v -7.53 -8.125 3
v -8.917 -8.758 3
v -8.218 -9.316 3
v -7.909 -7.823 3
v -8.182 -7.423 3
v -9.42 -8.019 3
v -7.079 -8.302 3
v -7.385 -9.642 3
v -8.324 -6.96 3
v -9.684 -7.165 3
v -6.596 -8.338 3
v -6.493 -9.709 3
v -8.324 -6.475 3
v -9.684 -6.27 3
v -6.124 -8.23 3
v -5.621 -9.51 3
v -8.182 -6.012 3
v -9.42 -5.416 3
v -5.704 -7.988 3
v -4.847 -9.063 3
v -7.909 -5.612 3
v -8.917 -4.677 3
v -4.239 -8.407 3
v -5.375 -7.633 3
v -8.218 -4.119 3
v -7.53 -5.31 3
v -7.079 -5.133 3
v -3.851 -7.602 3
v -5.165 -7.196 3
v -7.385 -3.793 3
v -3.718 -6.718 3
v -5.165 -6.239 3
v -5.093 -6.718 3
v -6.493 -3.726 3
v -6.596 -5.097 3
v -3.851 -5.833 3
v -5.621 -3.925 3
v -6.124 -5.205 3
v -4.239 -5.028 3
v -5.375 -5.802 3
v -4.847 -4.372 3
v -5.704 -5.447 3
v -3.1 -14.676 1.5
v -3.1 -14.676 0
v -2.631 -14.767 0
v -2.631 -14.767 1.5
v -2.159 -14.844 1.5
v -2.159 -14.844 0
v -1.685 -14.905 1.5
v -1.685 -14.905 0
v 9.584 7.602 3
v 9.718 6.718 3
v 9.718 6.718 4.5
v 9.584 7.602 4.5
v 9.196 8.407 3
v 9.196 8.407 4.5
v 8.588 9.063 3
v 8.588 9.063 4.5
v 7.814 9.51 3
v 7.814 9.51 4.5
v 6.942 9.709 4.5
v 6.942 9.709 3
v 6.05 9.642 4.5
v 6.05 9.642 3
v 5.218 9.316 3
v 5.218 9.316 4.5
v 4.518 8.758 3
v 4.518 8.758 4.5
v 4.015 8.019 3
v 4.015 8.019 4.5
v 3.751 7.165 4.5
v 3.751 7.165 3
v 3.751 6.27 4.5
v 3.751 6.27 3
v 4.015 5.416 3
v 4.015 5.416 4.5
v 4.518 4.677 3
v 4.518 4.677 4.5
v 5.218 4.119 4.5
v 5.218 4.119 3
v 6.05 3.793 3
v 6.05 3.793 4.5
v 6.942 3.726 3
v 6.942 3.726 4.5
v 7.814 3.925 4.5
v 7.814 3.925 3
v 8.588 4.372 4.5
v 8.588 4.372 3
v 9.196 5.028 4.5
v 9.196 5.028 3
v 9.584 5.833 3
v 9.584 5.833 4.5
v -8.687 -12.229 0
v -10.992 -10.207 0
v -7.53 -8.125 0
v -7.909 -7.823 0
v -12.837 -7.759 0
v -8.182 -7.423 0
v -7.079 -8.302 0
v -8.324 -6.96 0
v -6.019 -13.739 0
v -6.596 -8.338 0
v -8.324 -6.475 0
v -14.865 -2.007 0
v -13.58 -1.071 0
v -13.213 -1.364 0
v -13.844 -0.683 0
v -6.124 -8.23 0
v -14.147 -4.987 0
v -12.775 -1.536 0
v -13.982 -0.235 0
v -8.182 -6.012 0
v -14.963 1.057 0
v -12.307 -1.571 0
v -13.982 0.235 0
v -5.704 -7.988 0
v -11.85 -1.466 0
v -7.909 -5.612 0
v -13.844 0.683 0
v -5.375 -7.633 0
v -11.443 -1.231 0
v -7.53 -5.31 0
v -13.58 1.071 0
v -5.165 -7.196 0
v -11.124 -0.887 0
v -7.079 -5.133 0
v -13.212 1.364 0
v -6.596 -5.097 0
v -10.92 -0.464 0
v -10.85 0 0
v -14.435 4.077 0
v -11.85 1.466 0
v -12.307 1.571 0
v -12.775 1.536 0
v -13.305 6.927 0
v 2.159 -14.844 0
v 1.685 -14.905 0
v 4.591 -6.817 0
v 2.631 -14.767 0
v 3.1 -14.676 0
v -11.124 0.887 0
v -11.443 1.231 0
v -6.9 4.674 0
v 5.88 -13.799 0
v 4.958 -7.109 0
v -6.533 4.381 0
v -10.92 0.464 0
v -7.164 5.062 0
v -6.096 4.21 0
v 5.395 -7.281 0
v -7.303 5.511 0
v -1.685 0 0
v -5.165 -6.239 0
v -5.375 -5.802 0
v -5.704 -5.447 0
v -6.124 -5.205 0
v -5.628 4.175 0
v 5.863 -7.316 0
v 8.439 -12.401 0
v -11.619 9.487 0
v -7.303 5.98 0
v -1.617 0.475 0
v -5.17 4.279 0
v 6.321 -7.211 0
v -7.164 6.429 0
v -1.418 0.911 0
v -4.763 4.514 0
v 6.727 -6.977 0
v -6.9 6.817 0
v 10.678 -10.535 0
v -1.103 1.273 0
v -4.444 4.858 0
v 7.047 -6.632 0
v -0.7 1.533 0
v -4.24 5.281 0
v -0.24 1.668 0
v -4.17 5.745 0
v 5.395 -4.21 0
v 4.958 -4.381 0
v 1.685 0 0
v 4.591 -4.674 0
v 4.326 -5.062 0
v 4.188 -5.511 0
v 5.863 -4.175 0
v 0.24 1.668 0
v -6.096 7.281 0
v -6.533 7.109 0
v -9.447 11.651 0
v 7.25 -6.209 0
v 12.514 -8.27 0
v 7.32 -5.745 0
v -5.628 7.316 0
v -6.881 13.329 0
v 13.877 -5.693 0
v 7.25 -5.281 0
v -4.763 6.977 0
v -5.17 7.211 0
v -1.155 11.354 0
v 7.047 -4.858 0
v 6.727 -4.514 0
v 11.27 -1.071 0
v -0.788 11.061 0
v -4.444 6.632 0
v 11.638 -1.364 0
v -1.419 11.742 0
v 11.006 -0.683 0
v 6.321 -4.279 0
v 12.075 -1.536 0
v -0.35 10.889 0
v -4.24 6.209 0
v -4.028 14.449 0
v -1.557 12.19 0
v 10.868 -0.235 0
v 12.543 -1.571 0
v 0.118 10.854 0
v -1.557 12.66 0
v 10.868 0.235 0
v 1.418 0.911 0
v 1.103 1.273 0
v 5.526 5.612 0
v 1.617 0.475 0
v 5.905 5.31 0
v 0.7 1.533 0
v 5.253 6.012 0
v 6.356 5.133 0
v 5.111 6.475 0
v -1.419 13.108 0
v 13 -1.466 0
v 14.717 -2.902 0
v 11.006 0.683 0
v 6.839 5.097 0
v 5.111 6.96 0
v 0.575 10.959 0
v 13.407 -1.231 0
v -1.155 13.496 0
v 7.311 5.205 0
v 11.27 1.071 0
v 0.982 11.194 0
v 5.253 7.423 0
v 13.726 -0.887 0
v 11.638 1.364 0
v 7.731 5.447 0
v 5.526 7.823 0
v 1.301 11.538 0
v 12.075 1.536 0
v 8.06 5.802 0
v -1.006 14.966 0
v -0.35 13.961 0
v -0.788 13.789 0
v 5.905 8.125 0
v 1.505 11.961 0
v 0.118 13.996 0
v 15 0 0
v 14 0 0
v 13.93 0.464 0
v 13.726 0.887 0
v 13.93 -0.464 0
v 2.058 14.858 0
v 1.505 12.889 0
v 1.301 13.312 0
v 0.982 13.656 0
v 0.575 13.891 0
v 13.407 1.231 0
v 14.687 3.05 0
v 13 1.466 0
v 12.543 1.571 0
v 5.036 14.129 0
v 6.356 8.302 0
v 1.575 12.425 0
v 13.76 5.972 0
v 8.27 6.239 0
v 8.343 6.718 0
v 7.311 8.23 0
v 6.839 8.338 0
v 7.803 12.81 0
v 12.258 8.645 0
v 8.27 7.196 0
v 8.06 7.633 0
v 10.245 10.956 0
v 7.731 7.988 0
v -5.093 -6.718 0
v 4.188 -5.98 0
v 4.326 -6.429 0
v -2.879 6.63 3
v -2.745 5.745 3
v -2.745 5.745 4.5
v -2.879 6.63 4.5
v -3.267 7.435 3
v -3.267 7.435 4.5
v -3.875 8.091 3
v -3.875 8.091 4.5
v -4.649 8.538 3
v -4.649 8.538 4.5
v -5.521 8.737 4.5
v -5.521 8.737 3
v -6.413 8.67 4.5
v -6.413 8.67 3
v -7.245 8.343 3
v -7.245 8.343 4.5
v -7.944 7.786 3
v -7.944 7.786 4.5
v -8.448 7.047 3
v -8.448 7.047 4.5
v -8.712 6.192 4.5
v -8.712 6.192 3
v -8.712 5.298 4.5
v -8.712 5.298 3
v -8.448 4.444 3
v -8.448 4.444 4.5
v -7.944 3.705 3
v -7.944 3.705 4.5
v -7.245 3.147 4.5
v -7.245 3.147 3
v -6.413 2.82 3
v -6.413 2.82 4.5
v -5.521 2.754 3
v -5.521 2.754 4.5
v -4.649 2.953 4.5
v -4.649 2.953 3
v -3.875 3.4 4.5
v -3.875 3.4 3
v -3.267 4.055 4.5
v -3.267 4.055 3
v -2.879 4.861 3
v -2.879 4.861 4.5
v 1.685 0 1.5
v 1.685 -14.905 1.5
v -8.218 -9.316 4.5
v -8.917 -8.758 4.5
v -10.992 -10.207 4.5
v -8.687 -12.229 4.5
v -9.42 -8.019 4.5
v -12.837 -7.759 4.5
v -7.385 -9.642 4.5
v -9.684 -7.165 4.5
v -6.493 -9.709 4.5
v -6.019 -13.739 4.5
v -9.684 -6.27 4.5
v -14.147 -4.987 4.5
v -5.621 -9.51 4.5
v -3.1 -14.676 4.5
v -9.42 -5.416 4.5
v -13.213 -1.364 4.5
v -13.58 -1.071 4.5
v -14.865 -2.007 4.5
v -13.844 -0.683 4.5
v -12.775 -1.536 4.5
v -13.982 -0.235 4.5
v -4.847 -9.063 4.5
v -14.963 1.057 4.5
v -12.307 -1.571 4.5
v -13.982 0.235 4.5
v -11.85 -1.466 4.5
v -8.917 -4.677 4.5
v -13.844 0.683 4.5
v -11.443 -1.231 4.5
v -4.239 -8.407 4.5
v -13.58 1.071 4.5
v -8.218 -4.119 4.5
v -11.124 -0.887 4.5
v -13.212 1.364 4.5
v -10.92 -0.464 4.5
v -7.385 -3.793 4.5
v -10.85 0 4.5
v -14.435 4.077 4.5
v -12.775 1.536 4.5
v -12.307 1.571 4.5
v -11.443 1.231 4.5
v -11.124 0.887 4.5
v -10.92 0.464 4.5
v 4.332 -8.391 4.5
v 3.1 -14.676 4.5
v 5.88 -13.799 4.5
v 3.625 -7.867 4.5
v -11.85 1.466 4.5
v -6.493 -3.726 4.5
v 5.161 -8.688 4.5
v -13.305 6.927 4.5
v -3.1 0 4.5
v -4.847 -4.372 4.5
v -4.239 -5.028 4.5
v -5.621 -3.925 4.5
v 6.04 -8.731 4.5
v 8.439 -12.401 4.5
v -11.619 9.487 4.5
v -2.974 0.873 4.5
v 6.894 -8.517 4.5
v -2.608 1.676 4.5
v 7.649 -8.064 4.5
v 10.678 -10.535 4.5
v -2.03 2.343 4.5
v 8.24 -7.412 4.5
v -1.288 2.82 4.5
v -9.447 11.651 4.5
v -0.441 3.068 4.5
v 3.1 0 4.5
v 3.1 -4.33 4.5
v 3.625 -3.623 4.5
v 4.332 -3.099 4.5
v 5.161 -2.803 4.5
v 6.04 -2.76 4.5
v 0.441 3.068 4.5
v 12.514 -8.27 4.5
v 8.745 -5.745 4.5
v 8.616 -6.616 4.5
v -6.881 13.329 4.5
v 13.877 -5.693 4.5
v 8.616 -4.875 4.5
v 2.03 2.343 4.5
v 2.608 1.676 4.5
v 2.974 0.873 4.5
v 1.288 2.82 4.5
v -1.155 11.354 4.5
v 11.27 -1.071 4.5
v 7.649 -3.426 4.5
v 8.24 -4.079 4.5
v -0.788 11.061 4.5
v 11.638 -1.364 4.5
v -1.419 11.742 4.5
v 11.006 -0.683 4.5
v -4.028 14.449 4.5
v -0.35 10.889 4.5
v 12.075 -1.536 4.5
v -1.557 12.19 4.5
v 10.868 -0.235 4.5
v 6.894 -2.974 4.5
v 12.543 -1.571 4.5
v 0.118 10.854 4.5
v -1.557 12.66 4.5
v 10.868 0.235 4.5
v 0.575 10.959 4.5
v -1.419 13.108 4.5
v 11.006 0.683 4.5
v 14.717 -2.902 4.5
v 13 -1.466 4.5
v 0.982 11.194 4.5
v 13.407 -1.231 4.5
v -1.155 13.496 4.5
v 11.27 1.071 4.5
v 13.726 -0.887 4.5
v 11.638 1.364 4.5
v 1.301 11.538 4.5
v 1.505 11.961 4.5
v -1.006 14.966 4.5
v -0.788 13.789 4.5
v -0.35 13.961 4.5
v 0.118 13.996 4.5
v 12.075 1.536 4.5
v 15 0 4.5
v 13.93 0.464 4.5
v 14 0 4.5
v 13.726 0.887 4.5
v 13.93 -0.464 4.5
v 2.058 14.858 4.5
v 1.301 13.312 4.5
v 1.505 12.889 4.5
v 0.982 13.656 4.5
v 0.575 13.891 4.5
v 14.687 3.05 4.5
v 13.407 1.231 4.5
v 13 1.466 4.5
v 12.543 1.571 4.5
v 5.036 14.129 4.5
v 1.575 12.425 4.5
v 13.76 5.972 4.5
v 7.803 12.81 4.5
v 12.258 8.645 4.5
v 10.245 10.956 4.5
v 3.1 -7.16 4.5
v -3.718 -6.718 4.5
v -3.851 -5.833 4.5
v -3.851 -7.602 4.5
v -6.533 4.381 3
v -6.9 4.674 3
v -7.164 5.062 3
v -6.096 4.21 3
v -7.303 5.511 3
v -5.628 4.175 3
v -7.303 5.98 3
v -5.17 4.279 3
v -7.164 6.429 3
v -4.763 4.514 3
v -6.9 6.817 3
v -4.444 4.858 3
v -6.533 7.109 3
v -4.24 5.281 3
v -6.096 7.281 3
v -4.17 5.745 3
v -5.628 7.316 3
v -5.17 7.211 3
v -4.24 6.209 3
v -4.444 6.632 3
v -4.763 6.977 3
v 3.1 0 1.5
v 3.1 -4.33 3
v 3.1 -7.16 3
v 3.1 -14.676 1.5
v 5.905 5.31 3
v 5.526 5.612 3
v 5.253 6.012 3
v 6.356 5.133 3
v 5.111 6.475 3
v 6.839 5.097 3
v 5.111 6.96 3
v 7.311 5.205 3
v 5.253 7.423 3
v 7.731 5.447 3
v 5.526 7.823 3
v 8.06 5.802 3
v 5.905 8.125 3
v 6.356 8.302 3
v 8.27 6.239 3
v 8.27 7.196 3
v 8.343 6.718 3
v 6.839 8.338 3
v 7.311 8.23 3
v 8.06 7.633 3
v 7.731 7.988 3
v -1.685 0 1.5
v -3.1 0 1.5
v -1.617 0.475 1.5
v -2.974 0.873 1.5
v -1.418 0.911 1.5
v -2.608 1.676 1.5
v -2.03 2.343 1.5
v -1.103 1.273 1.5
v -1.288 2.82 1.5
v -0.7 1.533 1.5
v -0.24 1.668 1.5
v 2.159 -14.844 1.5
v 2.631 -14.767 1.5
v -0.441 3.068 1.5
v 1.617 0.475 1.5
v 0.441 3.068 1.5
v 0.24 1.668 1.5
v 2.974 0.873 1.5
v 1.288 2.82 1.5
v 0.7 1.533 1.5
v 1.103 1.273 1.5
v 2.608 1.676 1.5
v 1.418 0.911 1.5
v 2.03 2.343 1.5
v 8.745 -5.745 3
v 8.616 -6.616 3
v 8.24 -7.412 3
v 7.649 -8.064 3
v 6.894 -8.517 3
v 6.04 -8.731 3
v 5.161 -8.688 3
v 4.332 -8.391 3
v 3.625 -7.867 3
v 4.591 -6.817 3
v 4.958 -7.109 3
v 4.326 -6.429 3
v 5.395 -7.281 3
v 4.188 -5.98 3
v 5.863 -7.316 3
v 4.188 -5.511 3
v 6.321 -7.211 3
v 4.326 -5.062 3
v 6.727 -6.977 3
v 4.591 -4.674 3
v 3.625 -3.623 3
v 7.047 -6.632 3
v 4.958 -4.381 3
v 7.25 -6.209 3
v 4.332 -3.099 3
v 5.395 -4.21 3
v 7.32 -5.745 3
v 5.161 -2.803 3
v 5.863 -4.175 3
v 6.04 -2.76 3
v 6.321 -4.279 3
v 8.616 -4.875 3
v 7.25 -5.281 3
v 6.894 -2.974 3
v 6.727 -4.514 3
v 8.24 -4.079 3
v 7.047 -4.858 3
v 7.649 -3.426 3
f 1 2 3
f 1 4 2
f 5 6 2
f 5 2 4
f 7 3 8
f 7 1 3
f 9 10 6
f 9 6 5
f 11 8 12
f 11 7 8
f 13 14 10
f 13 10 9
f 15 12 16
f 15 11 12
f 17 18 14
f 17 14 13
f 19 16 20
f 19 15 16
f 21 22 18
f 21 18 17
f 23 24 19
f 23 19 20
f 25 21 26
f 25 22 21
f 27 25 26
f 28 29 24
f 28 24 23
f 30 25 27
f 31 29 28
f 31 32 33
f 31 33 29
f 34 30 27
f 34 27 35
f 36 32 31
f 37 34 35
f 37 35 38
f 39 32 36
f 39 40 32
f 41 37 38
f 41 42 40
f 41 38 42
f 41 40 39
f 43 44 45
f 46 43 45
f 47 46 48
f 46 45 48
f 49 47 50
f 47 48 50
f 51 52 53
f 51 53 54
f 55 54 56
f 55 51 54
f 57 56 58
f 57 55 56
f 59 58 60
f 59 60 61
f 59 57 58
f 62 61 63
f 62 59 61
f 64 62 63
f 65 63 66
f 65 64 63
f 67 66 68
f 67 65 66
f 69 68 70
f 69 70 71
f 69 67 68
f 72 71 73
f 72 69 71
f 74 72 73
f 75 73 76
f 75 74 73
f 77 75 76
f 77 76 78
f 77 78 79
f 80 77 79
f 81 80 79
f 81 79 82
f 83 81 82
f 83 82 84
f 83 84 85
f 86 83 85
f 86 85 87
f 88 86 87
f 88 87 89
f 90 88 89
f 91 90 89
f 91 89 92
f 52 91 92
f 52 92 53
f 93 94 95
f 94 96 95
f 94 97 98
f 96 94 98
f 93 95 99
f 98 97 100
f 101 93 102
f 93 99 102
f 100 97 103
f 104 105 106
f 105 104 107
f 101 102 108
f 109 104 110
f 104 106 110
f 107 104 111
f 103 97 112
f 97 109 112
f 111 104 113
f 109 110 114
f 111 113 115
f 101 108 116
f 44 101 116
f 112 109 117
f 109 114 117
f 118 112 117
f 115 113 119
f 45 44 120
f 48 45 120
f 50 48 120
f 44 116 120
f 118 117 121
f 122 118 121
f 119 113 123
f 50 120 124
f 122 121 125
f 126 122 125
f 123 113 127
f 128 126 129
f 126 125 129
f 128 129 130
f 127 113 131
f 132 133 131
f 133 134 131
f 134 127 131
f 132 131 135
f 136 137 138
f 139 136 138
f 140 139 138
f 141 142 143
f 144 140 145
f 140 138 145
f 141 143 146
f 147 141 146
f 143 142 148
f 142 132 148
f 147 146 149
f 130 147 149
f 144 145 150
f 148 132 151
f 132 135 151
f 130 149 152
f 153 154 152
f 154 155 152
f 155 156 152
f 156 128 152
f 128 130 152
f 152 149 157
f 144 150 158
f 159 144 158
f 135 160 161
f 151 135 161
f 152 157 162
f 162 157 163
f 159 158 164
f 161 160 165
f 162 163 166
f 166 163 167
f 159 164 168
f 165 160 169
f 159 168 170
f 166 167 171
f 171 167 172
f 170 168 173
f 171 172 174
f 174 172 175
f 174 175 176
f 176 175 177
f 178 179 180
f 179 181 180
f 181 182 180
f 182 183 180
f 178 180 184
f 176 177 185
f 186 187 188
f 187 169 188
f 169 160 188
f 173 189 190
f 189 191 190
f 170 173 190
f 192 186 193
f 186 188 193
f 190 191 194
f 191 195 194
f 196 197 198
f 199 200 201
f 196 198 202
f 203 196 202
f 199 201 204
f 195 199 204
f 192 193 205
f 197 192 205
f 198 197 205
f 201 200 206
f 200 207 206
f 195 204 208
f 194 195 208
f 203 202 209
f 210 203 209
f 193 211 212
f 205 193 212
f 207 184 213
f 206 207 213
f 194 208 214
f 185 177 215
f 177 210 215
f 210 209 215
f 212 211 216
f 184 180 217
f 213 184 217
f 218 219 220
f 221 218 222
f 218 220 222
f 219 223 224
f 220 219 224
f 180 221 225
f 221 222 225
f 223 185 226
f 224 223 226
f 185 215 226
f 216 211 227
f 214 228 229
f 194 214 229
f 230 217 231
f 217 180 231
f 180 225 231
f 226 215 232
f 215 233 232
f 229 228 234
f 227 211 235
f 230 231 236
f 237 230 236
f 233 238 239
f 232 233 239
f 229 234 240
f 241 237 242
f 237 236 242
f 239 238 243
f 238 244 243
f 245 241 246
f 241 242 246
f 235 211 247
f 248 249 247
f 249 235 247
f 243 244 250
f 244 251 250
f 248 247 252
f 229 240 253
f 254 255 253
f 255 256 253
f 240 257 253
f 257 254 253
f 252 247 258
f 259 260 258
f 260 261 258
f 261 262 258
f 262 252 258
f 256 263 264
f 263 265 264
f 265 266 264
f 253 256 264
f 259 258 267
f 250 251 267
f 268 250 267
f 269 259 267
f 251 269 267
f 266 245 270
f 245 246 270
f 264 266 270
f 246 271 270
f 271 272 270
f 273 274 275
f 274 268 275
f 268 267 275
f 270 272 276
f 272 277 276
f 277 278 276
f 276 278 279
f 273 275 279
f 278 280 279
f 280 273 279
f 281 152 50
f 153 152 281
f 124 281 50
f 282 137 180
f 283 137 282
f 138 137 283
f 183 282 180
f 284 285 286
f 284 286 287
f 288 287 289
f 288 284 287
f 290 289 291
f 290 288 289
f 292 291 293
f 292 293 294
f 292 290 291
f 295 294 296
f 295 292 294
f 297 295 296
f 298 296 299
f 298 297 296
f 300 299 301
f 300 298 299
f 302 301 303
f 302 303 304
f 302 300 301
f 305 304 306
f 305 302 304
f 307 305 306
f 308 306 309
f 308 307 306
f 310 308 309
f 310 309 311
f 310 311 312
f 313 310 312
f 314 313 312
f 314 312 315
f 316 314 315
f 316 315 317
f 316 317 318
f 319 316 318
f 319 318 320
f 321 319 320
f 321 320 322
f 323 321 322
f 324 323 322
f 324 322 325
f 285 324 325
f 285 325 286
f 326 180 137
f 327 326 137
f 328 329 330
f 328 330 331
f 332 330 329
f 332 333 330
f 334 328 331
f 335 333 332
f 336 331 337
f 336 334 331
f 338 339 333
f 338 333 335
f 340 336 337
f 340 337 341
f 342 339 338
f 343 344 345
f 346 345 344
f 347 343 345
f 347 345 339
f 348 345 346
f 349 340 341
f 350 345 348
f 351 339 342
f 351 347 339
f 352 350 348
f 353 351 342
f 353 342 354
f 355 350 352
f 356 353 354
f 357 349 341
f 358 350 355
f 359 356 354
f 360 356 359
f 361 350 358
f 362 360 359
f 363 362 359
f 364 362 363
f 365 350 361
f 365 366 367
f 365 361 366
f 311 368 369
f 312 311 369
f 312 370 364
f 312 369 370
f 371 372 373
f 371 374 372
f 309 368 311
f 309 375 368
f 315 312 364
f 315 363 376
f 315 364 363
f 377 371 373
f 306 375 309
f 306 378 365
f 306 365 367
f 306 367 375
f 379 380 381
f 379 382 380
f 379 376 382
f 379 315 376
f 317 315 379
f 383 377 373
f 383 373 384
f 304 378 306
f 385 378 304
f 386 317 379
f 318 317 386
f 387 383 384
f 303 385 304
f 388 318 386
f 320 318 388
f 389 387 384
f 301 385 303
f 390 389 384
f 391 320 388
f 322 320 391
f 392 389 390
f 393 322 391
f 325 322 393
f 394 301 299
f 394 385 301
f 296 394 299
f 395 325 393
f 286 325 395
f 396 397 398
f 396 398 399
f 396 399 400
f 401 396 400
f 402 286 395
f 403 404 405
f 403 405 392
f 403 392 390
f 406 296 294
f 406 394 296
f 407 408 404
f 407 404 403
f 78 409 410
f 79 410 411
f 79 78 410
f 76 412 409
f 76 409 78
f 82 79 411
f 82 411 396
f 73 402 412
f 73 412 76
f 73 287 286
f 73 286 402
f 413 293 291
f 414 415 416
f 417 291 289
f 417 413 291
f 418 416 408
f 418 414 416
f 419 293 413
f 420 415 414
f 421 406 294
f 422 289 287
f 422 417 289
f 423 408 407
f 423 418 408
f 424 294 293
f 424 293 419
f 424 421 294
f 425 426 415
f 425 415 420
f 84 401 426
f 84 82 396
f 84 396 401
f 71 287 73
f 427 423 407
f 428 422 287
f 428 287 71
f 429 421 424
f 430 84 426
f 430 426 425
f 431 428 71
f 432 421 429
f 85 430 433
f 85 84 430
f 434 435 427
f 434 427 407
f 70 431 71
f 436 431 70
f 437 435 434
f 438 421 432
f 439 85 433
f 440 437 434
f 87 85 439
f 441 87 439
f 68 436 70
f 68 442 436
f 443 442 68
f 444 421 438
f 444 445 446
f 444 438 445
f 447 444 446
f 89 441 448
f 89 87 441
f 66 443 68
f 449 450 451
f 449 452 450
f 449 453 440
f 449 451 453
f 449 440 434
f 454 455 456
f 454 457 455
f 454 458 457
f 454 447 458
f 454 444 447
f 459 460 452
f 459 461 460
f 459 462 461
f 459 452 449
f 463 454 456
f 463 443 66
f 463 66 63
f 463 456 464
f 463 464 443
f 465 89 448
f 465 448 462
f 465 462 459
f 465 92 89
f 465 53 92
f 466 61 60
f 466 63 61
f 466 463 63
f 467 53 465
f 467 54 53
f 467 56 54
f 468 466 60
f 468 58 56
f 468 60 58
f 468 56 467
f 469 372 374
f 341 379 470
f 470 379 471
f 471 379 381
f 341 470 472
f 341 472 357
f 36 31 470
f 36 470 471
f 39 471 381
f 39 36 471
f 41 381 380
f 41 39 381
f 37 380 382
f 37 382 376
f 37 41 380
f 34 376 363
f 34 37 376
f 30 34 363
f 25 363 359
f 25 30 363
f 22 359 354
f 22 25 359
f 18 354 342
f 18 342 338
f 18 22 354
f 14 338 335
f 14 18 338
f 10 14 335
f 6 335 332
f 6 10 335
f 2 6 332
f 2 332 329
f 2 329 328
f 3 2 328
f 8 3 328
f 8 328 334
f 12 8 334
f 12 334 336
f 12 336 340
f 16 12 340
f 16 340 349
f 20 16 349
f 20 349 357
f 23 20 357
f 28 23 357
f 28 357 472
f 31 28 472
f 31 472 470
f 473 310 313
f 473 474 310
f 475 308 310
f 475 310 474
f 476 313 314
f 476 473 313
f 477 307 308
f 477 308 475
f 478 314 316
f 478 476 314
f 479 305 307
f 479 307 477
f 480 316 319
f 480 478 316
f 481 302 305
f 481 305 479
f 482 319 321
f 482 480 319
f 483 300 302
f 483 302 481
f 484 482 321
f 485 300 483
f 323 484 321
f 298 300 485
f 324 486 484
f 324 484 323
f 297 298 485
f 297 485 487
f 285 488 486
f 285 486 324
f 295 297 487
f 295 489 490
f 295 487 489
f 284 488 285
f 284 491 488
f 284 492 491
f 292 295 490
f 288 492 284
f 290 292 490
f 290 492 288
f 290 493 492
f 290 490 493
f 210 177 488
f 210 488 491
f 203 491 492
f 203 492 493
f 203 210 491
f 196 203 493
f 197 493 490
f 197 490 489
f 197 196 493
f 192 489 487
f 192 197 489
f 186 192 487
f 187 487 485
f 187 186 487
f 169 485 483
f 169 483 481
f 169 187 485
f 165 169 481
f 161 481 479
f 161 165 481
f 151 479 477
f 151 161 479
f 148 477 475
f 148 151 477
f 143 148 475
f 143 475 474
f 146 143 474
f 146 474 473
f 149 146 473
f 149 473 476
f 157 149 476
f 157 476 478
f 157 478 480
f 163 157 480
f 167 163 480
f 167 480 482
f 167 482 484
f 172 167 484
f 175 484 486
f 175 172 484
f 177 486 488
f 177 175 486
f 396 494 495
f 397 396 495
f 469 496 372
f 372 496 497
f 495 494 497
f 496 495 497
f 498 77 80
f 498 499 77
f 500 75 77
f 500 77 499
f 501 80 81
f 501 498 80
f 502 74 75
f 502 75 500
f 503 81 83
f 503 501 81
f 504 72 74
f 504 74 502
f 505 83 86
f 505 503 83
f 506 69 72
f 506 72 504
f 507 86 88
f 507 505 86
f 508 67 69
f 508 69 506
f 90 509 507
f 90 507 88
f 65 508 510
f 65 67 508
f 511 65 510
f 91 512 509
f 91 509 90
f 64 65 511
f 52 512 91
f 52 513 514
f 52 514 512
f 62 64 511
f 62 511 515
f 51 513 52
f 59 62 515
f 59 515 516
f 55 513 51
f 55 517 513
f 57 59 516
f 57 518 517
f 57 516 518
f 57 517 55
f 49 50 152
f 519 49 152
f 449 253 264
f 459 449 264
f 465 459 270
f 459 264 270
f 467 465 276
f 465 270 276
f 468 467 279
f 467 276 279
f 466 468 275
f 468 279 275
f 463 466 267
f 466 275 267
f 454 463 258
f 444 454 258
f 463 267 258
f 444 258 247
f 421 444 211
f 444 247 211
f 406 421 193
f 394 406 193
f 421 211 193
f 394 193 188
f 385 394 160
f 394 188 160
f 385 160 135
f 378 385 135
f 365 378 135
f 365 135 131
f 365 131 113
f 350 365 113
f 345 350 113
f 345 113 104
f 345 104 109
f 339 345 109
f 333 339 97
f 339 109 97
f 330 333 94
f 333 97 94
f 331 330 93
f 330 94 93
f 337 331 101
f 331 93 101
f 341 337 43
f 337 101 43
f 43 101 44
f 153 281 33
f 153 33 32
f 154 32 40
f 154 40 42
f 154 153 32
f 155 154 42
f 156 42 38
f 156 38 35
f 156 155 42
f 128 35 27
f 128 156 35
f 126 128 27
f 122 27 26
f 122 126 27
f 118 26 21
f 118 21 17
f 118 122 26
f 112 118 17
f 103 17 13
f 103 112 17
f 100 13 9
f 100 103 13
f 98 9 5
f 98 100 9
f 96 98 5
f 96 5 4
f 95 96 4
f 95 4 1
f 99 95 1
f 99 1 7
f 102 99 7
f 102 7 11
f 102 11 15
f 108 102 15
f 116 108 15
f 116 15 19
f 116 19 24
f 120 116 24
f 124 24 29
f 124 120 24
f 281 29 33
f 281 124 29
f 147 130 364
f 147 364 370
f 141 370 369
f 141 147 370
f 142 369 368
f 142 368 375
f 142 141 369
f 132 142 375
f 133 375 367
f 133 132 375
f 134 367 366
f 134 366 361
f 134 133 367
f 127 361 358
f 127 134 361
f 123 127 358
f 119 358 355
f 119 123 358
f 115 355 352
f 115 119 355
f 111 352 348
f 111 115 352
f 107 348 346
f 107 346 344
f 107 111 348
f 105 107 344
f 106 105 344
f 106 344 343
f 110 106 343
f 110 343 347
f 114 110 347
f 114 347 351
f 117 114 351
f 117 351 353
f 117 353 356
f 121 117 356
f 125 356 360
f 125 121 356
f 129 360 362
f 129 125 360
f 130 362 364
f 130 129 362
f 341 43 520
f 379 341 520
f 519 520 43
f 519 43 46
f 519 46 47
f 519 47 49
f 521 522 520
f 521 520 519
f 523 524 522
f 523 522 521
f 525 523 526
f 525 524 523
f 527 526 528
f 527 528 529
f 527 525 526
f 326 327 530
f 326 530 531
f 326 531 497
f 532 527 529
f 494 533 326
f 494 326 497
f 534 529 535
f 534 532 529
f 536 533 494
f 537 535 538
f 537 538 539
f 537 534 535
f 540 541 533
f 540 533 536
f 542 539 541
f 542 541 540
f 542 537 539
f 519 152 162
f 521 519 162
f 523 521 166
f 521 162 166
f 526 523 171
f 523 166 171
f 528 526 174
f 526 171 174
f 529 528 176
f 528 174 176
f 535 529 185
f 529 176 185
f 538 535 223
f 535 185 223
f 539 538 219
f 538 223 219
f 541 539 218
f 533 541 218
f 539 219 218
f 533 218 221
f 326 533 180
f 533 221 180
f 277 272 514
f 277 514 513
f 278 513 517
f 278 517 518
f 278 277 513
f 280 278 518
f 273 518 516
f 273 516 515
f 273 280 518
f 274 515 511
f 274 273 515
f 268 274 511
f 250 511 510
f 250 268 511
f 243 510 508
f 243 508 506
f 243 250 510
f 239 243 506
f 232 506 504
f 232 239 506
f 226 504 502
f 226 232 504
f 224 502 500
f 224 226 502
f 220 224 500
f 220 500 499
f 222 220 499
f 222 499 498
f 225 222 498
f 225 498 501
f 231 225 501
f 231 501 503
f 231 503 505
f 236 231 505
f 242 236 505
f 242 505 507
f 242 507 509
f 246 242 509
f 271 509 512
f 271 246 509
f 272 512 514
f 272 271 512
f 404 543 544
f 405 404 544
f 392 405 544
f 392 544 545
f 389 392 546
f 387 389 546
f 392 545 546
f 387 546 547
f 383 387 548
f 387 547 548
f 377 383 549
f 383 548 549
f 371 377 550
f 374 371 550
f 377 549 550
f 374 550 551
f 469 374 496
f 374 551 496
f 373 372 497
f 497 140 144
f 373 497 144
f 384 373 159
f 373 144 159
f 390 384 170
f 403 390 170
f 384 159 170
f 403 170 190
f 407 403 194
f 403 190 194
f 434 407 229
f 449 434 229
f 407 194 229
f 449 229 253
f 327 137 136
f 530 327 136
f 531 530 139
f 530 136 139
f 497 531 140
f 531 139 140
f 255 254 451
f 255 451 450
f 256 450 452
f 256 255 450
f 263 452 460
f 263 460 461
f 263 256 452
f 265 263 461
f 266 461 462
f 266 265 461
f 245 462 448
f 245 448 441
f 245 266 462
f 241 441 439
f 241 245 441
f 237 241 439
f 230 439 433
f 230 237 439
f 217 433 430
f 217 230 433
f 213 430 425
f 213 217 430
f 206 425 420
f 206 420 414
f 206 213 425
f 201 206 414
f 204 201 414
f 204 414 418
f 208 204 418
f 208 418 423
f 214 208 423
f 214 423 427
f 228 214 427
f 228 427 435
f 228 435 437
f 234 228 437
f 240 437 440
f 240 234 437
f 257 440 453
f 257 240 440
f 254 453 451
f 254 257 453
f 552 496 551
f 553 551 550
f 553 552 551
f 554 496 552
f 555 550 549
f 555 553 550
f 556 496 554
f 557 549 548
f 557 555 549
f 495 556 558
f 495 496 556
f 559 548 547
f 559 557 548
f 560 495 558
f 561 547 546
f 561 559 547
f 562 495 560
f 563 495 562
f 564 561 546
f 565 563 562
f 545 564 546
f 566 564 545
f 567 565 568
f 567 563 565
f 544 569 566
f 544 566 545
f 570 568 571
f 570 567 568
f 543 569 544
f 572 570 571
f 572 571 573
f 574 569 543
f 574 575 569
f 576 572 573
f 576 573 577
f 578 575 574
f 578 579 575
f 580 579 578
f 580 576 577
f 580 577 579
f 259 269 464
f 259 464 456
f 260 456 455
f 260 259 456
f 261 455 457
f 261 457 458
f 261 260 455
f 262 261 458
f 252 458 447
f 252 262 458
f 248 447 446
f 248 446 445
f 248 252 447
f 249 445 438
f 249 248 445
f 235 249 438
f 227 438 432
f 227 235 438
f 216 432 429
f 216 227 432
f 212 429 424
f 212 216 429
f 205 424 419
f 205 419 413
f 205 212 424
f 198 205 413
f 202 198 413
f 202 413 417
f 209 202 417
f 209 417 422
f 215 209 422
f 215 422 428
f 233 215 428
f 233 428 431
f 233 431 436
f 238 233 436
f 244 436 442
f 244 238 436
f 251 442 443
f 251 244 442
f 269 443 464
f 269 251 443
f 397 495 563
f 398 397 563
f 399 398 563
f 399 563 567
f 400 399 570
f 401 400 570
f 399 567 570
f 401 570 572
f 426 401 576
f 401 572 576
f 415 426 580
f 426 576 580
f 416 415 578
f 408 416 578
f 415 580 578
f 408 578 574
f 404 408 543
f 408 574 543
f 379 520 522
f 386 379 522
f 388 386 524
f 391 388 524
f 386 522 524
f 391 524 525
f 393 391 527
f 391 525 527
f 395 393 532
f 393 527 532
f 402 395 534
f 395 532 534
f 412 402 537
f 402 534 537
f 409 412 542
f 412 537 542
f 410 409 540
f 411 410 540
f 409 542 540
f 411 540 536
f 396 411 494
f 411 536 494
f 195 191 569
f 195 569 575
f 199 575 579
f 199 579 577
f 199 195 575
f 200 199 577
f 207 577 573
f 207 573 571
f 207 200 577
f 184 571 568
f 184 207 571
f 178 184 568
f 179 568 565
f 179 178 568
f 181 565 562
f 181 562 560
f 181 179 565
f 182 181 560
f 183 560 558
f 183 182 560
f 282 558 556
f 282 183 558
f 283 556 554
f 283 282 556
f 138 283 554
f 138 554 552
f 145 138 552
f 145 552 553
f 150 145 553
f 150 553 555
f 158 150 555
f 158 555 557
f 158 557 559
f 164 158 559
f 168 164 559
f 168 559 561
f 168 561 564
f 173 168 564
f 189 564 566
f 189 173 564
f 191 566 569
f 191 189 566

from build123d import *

# Parameters (mm, degrees)
F1_DEPTH = 1.5
F0_R     = 3
F0_R_2   = 1.575
F2_DEPTH = 4.5
F0_R_3   = 1.625
F3_DEPTH = 3


# Not quite as in the source:
# - a feature names something its author has since deleted; it is built from what else it names


with BuildPart() as f1:
    # F0 (on Top) → F1 (new body)
    with BuildSketch(Plane.XY):
        with BuildLine():
            Line((-1.685, -4.7075232341), (-1.685, -2.6020712903))
            ThreePointArc((-1.685, -2.6020712903), (-2.7233710728, -1.4809625248), (-3.1, 0))
            Line((-3.1, 0), (-3.1, -3.9230090492))
            ThreePointArc((-3.1, -3.9230090492), (-2.4244425909, -4.3728798432), (-1.685, -4.7075232341))
        make_face()
        with BuildLine():
            Line((-1.685, -14.905058705), (-1.685, -4.7075232341))
            ThreePointArc((-1.685, -4.7075232341), (-2.4244425909, -4.3728798432), (-3.1, -3.9230090492))
            Line((-3.1, -3.9230090492), (-3.1, -14.6761711628))
            ThreePointArc((-3.1, -14.6761711628), (-2.3952356099, -14.8075266798), (-1.685, -14.905058705))
        make_face()
        with BuildLine():
            ThreePointArc((3.1, -3.9230090492), (2.4244425909, -4.3728798432), (1.685, -4.7075232341))
            Line((1.685, -4.7075232341), (1.685, -14.905058705))
            ThreePointArc((1.685, -14.905058705), (2.3952356099, -14.8075266798), (3.1, -14.6761711628))
            Line((3.1, -14.6761711628), (3.1, -7.1604074647))
            ThreePointArc((3.1, -7.1604074647), (2.7452425971, -5.7452425971), (3.1, -4.3300777296))
            Line((3.1, -4.3300777296), (3.1, -3.9230090492))
        make_face()
        with BuildLine():
            ThreePointArc((-1.685, 0), (0, 1.685), (1.685, 0))
            Line((1.685, 0), (1.685, -2.6020712903))
            ThreePointArc((1.685, -2.6020712903), (2.7233710728, -1.4809625248), (3.1, 0))
            ThreePointArc((3.1, 0), (0, 3.1), (-3.1, 0))
            ThreePointArc((-3.1, 0), (-2.7233710728, -1.4809625248), (-1.685, -2.6020712903))
            Line((-1.685, -2.6020712903), (-1.685, 0))
        make_face()
        with BuildLine():
            ThreePointArc((-3.1, 0), (0, 3.1), (3.1, 0))
            Line((3.1, 0), (3.1, -3.9230090492))
            ThreePointArc((3.1, -3.9230090492), (4.5, -2.1794494718), (5, 0))
            ThreePointArc((5, 0), (-2.1794494718, 4.5), (-3.1, -3.9230090492))
            Line((-3.1, -3.9230090492), (-3.1, 0))
        make_face()
        with BuildLine():
            ThreePointArc((3.1, 0), (2.7233710728, -1.4809625248), (1.685, -2.6020712903))
            Line((1.685, -2.6020712903), (1.685, -4.7075232341))
            ThreePointArc((1.685, -4.7075232341), (2.4244425909, -4.3728798432), (3.1, -3.9230090492))
            Line((3.1, -3.9230090492), (3.1, 0))
        make_face()
        with BuildLine():
            Line((3.1, -7.1604074647), (3.1, -4.3300777296))
            ThreePointArc((3.1, -4.3300777296), (2.7452425971, -5.7452425971), (3.1, -7.1604074647))
        make_face()
    extrude(amount=F1_DEPTH)

    # F0 (on Top) → F2 (join)
    with BuildSketch(Plane.XY):
        with BuildLine():
            ThreePointArc((-3.1, 0), (0, 3.1), (3.1, 0))
            Line((3.1, 0), (3.1, -3.9230090492))
            ThreePointArc((3.1, -3.9230090492), (4.5, -2.1794494718), (5, 0))
            ThreePointArc((5, 0), (-2.1794494718, 4.5), (-3.1, -3.9230090492))
            Line((-3.1, -3.9230090492), (-3.1, 0))
        make_face()
        with BuildLine():
            ThreePointArc((5, 0), (4.5, -2.1794494718), (3.1, -3.9230090492))
            Line((3.1, -3.9230090492), (3.1, -4.3300777296))
            ThreePointArc((3.1, -4.3300777296), (6.4747191933, -2.8352831652), (8.7452425971, -5.7452425971))
            ThreePointArc((8.7452425971, -5.7452425971), (6.4747191933, -8.6552020291), (3.1, -7.1604074647))
            Line((3.1, -7.1604074647), (3.1, -14.6761711628))
            ThreePointArc((3.1, -14.6761711628), (11.6511801977, -9.4472218138), (15, 0))
            ThreePointArc((15, 0), (-9.4472218138, 11.6511801977), (-3.1, -14.6761711628))
            Line((-3.1, -14.6761711628), (-3.1, -3.9230090492))
            ThreePointArc((-3.1, -3.9230090492), (-2.1794494718, 4.5), (5, 0))
        make_face()
        with Locations((-6.7175144213, -6.7175144213)):
            Circle(F0_R, mode=Mode.SUBTRACT)
        with Locations((-12.425, 0)):
            Circle(F0_R_2, mode=Mode.SUBTRACT)
        with Locations((-5.7452425971, 5.7452425971)):
            Circle(F0_R, mode=Mode.SUBTRACT)
        with Locations((6.7175144213, 6.7175144213)):
            Circle(F0_R, mode=Mode.SUBTRACT)
        with Locations((12.425, 0)):
            Circle(F0_R_2, mode=Mode.SUBTRACT)
        with Locations((0, 12.425)):
            Circle(F0_R_2, mode=Mode.SUBTRACT)
    extrude(amount=F2_DEPTH)

    # F0 (on Top) → F3 (join)
    with BuildSketch(Plane.XY):
        with Locations((-5.7452425971, 5.7452425971)):
            Circle(F0_R)
        with Locations((-5.7452425971, 5.7452425971)):
            Circle(F0_R_2, mode=Mode.SUBTRACT)
        with Locations((6.7175144213, 6.7175144213)):
            Circle(F0_R)
        with Locations((6.7175144213, 6.7175144213)):
            Circle(F0_R_3, mode=Mode.SUBTRACT)
        with BuildLine():
            ThreePointArc((8.7452425971, -5.7452425971), (6.4747191933, -2.8352831652), (3.1, -4.3300777296))
            Line((3.1, -4.3300777296), (3.1, -7.1604074647))
            ThreePointArc((3.1, -7.1604074647), (6.4747191933, -8.6552020291), (8.7452425971, -5.7452425971))
        make_face()
        with Locations((5.7452425971, -5.7452425971)):
            Circle(F0_R_2, mode=Mode.SUBTRACT)
        with Locations((-6.7175144213, -6.7175144213)):
            Circle(F0_R)
        with Locations((-6.7175144213, -6.7175144213)):
            Circle(F0_R_3, mode=Mode.SUBTRACT)
    extrude(amount=F3_DEPTH)


solid = f1.part
